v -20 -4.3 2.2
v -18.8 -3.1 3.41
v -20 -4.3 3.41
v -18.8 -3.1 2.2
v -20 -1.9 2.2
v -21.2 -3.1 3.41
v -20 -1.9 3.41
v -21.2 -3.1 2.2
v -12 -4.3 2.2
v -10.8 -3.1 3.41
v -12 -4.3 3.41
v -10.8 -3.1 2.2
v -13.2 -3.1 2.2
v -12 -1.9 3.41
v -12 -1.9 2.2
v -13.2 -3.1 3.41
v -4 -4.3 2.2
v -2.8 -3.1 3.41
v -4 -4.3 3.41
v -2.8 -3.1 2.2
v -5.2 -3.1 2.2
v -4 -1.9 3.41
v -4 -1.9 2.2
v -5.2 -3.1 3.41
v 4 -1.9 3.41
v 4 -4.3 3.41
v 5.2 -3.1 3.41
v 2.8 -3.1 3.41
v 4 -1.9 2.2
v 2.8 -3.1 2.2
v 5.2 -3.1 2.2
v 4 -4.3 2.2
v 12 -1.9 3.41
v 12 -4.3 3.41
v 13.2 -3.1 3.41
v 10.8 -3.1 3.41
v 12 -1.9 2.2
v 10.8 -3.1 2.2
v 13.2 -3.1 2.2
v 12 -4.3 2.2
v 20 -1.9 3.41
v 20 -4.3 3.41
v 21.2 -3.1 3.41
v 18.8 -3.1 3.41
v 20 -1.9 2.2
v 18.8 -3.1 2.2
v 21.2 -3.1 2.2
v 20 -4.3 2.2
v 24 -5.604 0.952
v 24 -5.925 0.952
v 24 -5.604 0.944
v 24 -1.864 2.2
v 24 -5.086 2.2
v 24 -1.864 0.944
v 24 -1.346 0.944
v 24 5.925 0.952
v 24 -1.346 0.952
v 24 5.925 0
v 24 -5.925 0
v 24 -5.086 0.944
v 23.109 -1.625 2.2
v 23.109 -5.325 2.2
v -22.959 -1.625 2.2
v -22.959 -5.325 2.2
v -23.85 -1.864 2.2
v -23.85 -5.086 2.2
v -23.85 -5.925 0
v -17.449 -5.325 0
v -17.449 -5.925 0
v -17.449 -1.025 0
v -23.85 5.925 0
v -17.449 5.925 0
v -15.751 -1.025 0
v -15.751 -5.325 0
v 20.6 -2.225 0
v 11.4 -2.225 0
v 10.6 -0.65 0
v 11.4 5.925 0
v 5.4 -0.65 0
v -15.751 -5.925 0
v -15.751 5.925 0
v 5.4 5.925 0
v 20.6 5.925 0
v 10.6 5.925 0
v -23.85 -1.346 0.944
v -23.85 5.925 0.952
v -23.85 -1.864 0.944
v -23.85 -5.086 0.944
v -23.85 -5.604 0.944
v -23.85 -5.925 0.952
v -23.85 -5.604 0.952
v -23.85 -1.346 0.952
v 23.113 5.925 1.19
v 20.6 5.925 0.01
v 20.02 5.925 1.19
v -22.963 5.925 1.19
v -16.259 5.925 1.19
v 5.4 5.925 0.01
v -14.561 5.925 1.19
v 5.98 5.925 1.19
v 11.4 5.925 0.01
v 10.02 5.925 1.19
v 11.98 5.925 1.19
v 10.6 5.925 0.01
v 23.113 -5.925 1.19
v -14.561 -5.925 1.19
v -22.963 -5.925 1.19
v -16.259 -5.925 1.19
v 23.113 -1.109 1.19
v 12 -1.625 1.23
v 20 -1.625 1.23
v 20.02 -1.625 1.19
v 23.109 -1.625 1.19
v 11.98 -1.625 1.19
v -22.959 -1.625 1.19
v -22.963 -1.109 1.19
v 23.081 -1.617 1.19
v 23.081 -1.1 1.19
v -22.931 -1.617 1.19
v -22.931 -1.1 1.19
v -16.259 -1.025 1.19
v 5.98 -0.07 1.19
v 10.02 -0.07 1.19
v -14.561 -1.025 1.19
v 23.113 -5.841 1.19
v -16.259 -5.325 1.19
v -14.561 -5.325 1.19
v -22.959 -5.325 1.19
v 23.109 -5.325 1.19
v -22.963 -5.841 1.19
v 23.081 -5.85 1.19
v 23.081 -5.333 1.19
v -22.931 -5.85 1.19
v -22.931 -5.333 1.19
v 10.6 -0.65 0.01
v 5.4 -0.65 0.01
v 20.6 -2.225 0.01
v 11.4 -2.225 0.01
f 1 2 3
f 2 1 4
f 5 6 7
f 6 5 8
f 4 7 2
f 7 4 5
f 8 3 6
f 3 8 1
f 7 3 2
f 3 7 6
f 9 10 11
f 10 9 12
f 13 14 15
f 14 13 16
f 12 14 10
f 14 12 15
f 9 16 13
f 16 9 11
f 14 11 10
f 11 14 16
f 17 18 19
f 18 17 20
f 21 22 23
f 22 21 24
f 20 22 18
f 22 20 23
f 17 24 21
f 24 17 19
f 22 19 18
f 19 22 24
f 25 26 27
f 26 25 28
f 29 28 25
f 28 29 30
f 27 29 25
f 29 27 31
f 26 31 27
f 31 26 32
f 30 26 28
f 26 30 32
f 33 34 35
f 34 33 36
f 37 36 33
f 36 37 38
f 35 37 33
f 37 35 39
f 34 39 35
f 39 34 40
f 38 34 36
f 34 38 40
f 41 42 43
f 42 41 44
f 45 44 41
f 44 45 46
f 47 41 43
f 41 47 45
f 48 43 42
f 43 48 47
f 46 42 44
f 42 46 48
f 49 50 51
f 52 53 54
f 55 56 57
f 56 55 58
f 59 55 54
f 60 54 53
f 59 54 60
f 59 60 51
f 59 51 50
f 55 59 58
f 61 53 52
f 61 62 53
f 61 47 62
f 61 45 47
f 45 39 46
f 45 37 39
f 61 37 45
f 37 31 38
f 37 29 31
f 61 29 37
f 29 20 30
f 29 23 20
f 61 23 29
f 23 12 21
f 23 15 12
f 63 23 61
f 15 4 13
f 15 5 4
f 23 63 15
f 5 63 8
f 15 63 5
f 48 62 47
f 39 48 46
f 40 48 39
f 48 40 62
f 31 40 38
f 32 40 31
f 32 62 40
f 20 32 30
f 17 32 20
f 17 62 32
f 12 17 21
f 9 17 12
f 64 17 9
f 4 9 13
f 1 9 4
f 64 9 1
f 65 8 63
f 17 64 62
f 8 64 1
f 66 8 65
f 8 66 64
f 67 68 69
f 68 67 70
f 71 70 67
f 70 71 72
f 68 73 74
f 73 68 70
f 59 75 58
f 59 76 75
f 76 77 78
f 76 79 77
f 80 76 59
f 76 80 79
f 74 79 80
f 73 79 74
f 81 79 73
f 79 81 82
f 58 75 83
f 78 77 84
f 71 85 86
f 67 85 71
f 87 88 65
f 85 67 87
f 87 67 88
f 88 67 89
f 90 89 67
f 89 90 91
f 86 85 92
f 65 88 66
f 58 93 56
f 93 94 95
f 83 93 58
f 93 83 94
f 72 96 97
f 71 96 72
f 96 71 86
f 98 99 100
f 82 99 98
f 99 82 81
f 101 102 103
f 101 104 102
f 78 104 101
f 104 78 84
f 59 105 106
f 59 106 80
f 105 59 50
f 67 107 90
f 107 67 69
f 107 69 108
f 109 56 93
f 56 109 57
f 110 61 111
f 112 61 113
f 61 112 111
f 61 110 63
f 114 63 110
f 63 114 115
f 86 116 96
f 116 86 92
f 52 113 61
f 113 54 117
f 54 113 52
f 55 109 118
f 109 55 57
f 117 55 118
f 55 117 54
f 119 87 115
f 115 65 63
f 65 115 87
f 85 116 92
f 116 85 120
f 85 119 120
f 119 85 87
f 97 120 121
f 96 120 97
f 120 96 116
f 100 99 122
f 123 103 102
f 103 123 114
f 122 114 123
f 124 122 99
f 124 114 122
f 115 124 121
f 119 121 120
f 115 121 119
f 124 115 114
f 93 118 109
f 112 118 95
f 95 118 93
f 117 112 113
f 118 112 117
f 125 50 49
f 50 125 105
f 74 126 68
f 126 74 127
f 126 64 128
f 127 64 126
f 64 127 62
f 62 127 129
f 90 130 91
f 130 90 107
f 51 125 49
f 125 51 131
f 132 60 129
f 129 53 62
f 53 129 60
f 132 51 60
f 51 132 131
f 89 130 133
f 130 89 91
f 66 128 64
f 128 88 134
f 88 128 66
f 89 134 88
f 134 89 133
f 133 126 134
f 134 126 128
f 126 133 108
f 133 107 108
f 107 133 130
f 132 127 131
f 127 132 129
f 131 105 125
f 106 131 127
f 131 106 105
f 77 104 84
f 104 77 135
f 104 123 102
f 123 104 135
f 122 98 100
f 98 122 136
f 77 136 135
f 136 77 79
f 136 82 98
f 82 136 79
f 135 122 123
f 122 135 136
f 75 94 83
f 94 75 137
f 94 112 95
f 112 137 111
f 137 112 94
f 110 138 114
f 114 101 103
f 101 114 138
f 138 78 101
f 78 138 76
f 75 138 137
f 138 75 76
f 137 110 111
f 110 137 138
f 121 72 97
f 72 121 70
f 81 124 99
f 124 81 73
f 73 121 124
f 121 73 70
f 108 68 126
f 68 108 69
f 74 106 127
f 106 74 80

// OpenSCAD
// Arcus-3D-P1 -Lego compatible drag feeder OpenSCAD source

// Licensed under the Creative Commons Attribution-ShareAlike 3.0 Unported License
// http://creativecommons.org/licenses/by-sa/3.0/

// Project home
// https://hackaday.io/project/160857

// Author
// Daren Schwenke at g mail dot com

// Please like my projects if you find them useful.  Thank you.

// global, to become constant, for command line rendering.
print = "combo";
length = 6; // Length in mm =  8 * length 
depth = 8;
width = 8;
//////////////////////////////////////////////////////////////
// Globals
// General clearance, aka, dead space beteen parts for imprecise printing.
clearance=.15;

// Nozzle size for parts only a few widths thick.  Using an even number here ensures better paths for slicer.
nozzle_dia=.3;

// Rendering circle complexity.  Turn down while editing, up while rendering.

// Many things are a multiple of this general wall thickness.
// 1.2mm is magic, as it's both 3*0.4mm or 4*0.3mm
// If you have a different nozzle size and want the best results, keep this in mind.
// Using an even number here generates better paths in slicers.
wall_h=nozzle_dia*4; 

// For differencing so OpenSCAD doesn't freak out
extra=.02;

////////////// do not edit the next two vars //////////////////
// the Lego unit 
u=1.6;
// distance Lego between posts
post_u=u*5; // this is 8mm.

////  Ok... have at it.

// Length of the block
block_l=post_u*length;
 
tape_d=depth;
tape_w=width + clearance;
tape_edge_inset=.6;
tape_hole_inset=2.5;
tape_inset_w=tape_w-tape_hole_inset-tape_edge_inset; 
tape_edge_h=1; // tape edge thickness

peel_l_offset=block_l/6;

pick_l_offset=block_l-post_u*2;
pick_l=4;

drag_l_offset=pick_l_offset+post_u;
drag_l=8;

base_h=1.6*2+wall_h;
top_h=wall_h; 

block_w=12-clearance;
block_h=base_h+tape_d+top_h;

//////////////////////////////////////////////////////////////
// The parts for rendering

print_this = print;
if (print_this == "base") translate([0,0,block_w/2]) strip_feeder_base();
if (print_this == "pick") strip_feeder_pick();
if (print_this == "peel") strip_feeder_peel();
if (print_this == "combo") strip_feeder_combo();
if (print_this == "cover") strip_feeder_cover();
if (print_this == "fill") strip_feeder_fill();
if (print_this == "open") strip_feeder_open();
if (print_this == "all" ) print_all();

if (0) assembly_view();

module print_all() {
	translate([0,60,0]) strip_feeder_pick();
	translate([0,40,0]) strip_feeder_peel();
	translate([0,20,0]) strip_feeder_combo();
	translate([0,0,0]) strip_feeder_cover();
	translate([0,-15,0]) strip_feeder_fill();
	translate([0,-30,0]) strip_feeder_open();
	translate([0,-48,block_w/2]) strip_feeder_base();
}

module assembly_view() {
	for (i=[1]) translate([block_l*i,0,0]) rotate([90,0,0]) strip_feeder_base();
	//translate([0,0,block_h/2+tape_edge_h+top_h/2+extra]) rotate([180,0,0]) strip_feeder_fill();
	translate([block_l,0,block_h/2+tape_edge_h+top_h/2+extra]) rotate([180,0,0]) strip_feeder_combo();
}

module strip_feeder_base() {
	// modeled on it's side for printing.
	difference() {
		translate([clearance/2,0,0]) cube([block_l-clearance,base_h+tape_d,block_w],center=true);
		// base cutout
		translate([0,-block_h/2-extra,0]) rotate([90,0,0]) lego_base(l=block_l/1.6/5 + 1);
		// lead in
		translate([0,block_h/2-tape_edge_h/12,-block_w/2+tape_edge_inset-tape_w/2]) rotate([270,0,0]) tape_slot();
		// below tape area cutout
		translate([0,base_h/2+extra,block_w/2+tape_edge_inset-(tape_w-tape_hole_inset)/2]) cube([block_l*1.5+extra,tape_d,tape_w-tape_hole_inset+extra],center=true);
		translate([0,block_h/2+tape_edge_h+top_h/2+extra,0]) rotate([90,0,0]) pins(add=clearance);
		// mass cutouts
		for (i=[0:8:block_l-9]) translate([-block_l/2+12+i,base_h/2-wall_h/2+extra,0]) cube([8-wall_h,tape_d-wall_h,block_w+extra],center=true);
		translate([-block_l/2+4+clearance,base_h/2-wall_h/2+extra,0]) cube([8-wall_h,tape_d-wall_h,block_w+extra],center=true);
	}
}

module strip_feeder_pick_base() {
	// modeled on it's side for printing.
	difference() {
		translate([clearance/2,0,0]) cube([block_l-clearance,base_h+tape_d,block_w],center=true);
		// base cutout
		translate([0,-block_h/2-extra,0]) rotate([90,0,0]) lego_base(l=block_l/1.6/5 + 1);
		// lead in
		translate([0,block_h/2-tape_edge_h/12,-block_w/2+tape_edge_inset-tape_w/2]) rotate([270,0,0]) tape_slot();
		// below tape area cutout
		translate([0,base_h/2+extra,block_w/2+tape_edge_inset-(tape_w-tape_hole_inset)/2]) cube([block_l*1.5+extra,tape_d,tape_w-tape_hole_inset+extra],center=true);
		translate([0,block_h/2+tape_edge_h+top_h/2+extra,0]) rotate([90,0,0]) pins(add=clearance);
		// mass cutouts
		for (i=[0:8:block_l-9]) translate([-block_l/2+12+i,base_h/2-wall_h/2+extra,0]) cube([8-wall_h,tape_d-wall_h,block_w+extra],center=true);
		translate([-block_l/2+4+clearance,base_h/2-wall_h/2+extra,0]) cube([8-wall_h,tape_d-wall_h,block_w+extra],center=true);
		translate([-block_l/2+pick_l_offset,tape_w/2-tape_hole_inset,-tape_edge_h/2+extra]) hull() { 
			cube([pick_l,tape_w,extra],center=true);
			translate([0,0,-top_h-extra]) cube([pick_l+wall_h,tape_w+wall_h,extra],center=true);
		}
	}
}

module strip_feeder_fill(add=0) {
	difference() {
		union() {
			translate([clearance/2,0,(tape_edge_h+top_h)/2]) cube([block_l-clearance,block_w,tape_edge_h+top_h],center=true);
			pins(add=add);
		}
		translate([0,block_w/2+tape_edge_inset-tape_w/2,top_h+tape_edge_h/2]) {
			tape_slot();
			fill_slot();
		}
	}
}

module strip_feeder_open(add=0) {
	difference() {
		union() {
			translate([clearance/2,0,(tape_edge_h+top_h)/2]) cube([block_l-clearance,block_w,tape_edge_h+top_h],center=true);
			pins(add=add);
		}
		translate([0,block_w/2+tape_edge_inset-tape_w/2,top_h+tape_edge_h/2]) {
			scale([1,1,5]) tape_slot();
		}
	}
}

module strip_feeder_combo(add=0) {
	difference() {
		union() {
			translate([clearance/2,0,(tape_edge_h+top_h)/2]) cube([block_l-clearance,block_w,tape_edge_h+top_h],center=true);
			pins(add=add);
		}
		translate([0,block_w/2+tape_edge_inset-tape_w/2,top_h+tape_edge_h/2]) {
			tape_slot();
			pick_slot();
			peel_slot();
		}
	}
}

module strip_feeder_peel(add=0) {
	difference() {
		union() {
			translate([clearance/2,0,(tape_edge_h+top_h)/2]) cube([block_l-clearance,block_w,tape_edge_h+top_h],center=true);
			pins(add=add);
		}
		translate([0,block_w/2+tape_edge_inset-tape_w/2,top_h+tape_edge_h/2]) {
			tape_slot();
			peel_slot();
		}
	}
}

module strip_feeder_pick(add=0) {
	difference() {
		union() {
			translate([clearance/2,0,(tape_edge_h+top_h)/2]) cube([block_l-clearance,block_w,tape_edge_h+top_h],center=true);
			pins(add=add);
		}
		translate([0,block_w/2+tape_edge_inset-tape_w/2,top_h+tape_edge_h/2]) {
			// tape slot cutout
			tape_slot();
			pick_slot();
		}
	}
}

module strip_feeder_cover(add=0) {
	difference() {
		// body
		union() {
			translate([clearance/2,0,(tape_edge_h+top_h)/2]) cube([block_l-clearance,block_w,tape_edge_h+top_h],center=true);
			pins(add=add);
		}
		translate([0,block_w/2+tape_edge_inset-tape_w/2,top_h+tape_edge_h/2]) {
			tape_slot();
		}
	}
}

module pick_slot(pick_l_offset=pick_l_offset,drag_l_offset=drag_l_offset) {
	// tape slot cutout
	translate([-block_l/2+pick_l_offset,tape_w/2-tape_hole_inset,-tape_edge_h/2+extra]) hull() { 
		cube([pick_l,tape_w,extra],center=true);
		translate([0,0,-top_h-extra]) cube([pick_l+wall_h,tape_w+wall_h,extra],center=true);
	}
	translate([-block_l/2+drag_l_offset,0,-tape_edge_h/2+extra]) hull() { 
		cube([drag_l,tape_w,extra],center=true);
		translate([0,0,-top_h-extra]) cube([drag_l+wall_h,tape_w+wall_h,extra],center=true);
	}
}

module peel_slot(peel_l_offset=peel_l_offset) {
	for (i=[0,1]) translate([0,-i*block_w,0]) {
		cube([block_l+extra,tape_w,tape_edge_h+extra],center=true);
		translate([-block_l/2+peel_l_offset,tape_edge_inset/2,-top_h/2-tape_edge_h/2]) rotate([0,-45,0]) cube([wall_h*4,tape_w-tape_edge_inset,wall_h],center=true);
	}
}

module tape_slot() {
	for (i=[-1,1]) translate([0,-block_w/2-i*block_w/2,0]) {
		cube([block_l+extra,tape_w,tape_edge_h+extra],center=true);
		for (j=[1,-1]) translate([block_l/2*j+clearance/2,0,-tape_edge_h/4]) rotate([0,15*j,0]) cube([wall_h*4,tape_w,tape_edge_h],center=true);
		for (j=[1,-1]) translate([block_l/2*j+clearance/2,tape_w/2*i,0]) intersection() {
			rotate([0,0,90+15*i*j]) cube([tape_edge_h/2,wall_h*4,tape_edge_h*2],center=true);
			rotate([0,15*j,0]) cube([wall_h*4,tape_w,tape_edge_h*1.5],center=true);
		}
	}
}

module fill_slot() {
	for (i=[0,1]) translate([0,-i*block_w,0]) {
		translate([0,tape_hole_inset/4,-tape_edge_h/2+extra]) hull() { 
			cube([block_l,tape_w-tape_hole_inset,extra],center=true);
			translate([0,0,-top_h-extra]) cube([block_l+extra,tape_w-tape_hole_inset+wall_h,extra],center=true);
		}
	}
}

module pins(add=0) {
	for (i=[0:8:block_l-1]) translate([-block_l/2+4+i,-block_w/2+tape_w/2-tape_hole_inset/2,top_h+tape_edge_h+wall_h/2+add/2]) cylinder(r2=wall_h+add,r1=wall_h+1.5*add,$fn=4,h=wall_h+add+extra,center=true);
}


module lego_base(l=12,w=1,holes=0) {
	// width 1 is actually 2 posts, because I added a third fitting between at half spacing.
	pin=3*u;
	h=2;
	translate([0,0,-h*u]) {
		for (i=[0:1:l]) {
			for (j=[0:1:w*2]) translate([-l*u*5/2+5*u*i,u*5*j/2-2.5*u,h*u/2]) rotate([0,0,22.5]) cylinder(r1=3.25*u/2+clearance,r2=3.25*u/2+clearance/6,h=h*u,$fn=8,center=true);
			translate([-l*u*5/2-2.5*u+5*u*i,0,h*u/2]) cube([.75*u,10*u,h*u],center=true);	
		}
		if (holes) for (i=[0:2:l]) for (j=[w]) translate([-l*u*5/2+5*u*i,u*5*j/2-2.5*u,-h*u]) rotate([0,0,22.5]) cylinder(r=3*u/2+clearance/6,h=h*u*2+extra*2,center=true);
	}
}
